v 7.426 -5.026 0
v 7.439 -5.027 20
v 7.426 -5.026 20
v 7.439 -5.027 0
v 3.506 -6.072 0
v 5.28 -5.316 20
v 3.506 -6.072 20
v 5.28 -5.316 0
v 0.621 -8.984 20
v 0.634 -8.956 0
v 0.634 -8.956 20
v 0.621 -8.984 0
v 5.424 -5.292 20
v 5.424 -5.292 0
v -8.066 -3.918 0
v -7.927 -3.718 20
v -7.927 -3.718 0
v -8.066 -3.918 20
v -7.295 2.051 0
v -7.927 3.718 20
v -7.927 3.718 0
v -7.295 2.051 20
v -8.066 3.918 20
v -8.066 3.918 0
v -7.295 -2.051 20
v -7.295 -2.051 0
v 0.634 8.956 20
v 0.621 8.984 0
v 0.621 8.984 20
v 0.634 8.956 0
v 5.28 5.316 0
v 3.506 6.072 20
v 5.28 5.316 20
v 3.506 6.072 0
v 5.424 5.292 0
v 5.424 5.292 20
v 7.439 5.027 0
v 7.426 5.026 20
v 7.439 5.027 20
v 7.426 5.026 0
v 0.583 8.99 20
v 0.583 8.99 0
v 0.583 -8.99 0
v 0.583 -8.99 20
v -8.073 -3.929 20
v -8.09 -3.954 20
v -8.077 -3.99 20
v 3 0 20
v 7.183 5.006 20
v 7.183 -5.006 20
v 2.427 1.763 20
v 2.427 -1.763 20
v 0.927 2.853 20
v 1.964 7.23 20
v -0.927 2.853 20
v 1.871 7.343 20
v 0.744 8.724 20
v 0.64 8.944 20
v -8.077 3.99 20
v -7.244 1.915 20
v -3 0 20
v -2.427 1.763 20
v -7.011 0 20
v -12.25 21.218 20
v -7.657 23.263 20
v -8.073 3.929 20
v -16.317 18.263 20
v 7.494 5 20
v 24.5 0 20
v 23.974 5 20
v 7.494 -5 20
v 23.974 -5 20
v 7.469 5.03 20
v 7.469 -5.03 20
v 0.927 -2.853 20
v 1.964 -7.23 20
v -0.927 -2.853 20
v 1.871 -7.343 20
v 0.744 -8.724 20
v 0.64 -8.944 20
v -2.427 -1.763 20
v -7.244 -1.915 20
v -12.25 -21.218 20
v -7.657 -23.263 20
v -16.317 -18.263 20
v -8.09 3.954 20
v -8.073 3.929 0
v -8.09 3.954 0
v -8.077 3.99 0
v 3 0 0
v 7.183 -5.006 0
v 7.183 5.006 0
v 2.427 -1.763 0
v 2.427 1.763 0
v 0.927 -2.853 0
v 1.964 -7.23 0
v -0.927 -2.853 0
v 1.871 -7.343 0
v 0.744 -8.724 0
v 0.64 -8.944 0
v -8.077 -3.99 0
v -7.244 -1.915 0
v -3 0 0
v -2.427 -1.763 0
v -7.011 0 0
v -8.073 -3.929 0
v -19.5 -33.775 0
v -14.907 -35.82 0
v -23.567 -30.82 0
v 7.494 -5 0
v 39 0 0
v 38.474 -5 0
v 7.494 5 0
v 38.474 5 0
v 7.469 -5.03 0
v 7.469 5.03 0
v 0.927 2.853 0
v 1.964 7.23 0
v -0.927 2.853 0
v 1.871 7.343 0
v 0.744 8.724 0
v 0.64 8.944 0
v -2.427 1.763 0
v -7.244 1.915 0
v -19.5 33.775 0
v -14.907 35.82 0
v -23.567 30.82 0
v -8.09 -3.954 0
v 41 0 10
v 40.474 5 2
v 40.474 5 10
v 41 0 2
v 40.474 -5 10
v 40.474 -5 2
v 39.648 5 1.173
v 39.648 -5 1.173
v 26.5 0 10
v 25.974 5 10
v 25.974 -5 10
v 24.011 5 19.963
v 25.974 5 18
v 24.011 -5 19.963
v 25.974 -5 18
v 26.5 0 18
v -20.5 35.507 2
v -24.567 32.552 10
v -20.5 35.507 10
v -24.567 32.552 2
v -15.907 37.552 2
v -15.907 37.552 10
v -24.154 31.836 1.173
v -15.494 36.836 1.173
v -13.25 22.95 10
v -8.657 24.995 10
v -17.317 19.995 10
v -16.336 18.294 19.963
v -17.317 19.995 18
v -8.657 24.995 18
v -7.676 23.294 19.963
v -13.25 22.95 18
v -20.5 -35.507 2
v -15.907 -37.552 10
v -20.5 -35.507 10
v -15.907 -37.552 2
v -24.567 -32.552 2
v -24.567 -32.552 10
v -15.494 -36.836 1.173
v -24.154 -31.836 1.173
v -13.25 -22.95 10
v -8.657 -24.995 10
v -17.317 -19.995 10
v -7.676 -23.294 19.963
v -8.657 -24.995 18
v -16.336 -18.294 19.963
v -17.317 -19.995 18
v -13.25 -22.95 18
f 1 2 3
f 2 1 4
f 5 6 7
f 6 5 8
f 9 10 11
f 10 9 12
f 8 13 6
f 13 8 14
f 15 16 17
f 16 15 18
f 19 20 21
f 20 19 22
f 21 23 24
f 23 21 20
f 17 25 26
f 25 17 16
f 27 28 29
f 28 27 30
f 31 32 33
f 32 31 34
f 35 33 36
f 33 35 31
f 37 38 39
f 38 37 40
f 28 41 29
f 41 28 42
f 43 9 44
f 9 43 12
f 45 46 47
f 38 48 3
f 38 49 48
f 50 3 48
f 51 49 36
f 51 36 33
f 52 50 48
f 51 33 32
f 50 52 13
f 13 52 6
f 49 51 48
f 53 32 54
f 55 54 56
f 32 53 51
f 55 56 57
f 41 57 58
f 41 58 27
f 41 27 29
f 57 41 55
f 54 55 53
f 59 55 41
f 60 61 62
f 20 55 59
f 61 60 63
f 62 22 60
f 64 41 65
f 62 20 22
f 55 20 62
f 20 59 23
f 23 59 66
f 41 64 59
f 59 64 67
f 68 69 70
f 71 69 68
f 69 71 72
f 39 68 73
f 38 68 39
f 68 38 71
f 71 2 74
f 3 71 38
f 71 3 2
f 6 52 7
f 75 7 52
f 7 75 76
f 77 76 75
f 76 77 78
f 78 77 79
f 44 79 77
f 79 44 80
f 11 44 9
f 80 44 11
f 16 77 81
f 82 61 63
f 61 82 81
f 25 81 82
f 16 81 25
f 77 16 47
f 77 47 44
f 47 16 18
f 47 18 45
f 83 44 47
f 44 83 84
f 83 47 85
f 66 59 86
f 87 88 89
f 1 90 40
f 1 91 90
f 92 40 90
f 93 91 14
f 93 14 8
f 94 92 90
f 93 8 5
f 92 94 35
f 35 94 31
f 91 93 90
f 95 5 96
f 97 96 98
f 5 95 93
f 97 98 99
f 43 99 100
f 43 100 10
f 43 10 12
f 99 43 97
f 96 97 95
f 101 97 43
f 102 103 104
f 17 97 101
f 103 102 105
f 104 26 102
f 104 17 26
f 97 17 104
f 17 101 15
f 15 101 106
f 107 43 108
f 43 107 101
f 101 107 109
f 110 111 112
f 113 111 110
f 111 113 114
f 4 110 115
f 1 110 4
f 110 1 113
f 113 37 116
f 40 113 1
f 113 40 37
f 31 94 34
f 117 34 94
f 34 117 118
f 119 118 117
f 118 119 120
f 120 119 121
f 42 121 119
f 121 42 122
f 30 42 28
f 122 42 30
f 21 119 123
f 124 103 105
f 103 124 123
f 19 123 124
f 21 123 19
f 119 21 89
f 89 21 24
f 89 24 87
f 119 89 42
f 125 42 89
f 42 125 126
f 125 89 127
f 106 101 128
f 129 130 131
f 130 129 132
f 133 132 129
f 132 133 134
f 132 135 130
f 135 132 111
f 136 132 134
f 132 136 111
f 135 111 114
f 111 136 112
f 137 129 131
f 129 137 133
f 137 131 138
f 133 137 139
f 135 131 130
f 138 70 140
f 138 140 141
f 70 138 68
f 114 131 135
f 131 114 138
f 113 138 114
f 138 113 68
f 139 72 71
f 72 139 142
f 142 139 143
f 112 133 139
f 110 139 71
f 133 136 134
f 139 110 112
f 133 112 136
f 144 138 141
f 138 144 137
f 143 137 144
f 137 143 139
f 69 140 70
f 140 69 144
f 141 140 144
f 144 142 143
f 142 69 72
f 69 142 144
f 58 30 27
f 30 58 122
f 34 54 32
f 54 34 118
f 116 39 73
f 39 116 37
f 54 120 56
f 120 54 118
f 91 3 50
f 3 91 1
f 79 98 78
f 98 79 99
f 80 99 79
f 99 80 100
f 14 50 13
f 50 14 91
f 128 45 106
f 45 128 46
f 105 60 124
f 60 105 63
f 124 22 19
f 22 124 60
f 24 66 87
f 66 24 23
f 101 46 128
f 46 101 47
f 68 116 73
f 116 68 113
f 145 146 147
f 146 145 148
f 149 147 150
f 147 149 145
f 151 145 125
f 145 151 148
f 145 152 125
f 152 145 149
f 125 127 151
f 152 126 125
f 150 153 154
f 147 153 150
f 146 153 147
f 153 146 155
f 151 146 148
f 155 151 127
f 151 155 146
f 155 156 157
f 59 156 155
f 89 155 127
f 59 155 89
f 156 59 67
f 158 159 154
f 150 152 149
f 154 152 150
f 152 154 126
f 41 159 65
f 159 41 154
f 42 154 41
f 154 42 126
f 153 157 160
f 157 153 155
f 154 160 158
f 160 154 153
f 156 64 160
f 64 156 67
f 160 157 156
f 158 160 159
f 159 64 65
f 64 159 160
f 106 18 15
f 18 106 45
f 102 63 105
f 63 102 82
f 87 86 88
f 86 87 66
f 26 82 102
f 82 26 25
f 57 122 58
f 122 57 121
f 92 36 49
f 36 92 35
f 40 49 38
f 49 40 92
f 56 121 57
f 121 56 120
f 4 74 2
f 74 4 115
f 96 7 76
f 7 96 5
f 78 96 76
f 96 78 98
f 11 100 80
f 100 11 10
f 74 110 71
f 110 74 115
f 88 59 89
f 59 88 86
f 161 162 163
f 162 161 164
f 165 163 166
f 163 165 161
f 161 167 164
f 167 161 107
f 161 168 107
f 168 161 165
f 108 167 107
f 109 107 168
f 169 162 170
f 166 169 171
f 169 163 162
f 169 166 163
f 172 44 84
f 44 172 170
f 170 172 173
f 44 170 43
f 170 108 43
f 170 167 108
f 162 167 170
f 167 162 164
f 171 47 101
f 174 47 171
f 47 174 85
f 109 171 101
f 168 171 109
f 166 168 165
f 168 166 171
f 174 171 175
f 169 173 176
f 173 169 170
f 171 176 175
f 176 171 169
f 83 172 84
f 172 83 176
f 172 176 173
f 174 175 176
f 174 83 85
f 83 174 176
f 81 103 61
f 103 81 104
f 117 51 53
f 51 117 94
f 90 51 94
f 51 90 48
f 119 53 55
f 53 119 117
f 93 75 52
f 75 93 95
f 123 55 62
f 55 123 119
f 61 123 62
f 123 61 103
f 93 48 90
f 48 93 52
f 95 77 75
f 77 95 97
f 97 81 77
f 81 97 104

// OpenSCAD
/* [Dimensions] */
// Height/depth of large diameter side
large_height=10;
// Height/depth of small diameter side
small_height=10;

// Diameter of spool holes (makerbot spool is 82 and 53)
diameter1=82;
diameter2=53;

strut_width=10;

/* [Options] */
// Lip to hold adapter, use if larger spool hole will be on the bottom
lip=0; // [0:None,2:Small,3:Medium,5:Heavy]
// How far out the lip comes. 0 makes the lip come out as far as it is thick in a bevel (and doesn't need support!)
lip_extent=3; // [0:10]
// Hole in the middle, 0 to disable
hole_diameter=6;
hole=hole_diameter/2;

/* [Tweaks] */
struts=3; // [2:8]
bevel=2;

// Fillet joint between struts (0 to disable)
fillet_radius=8;

/* [Hidden] */

depth=[large_height,small_height];
depth1=large_height;
depth2=small_height;

radii=[max(diameter1,diameter2)/2,min(diameter1,diameter2)/2];

module inner_fillet(r,w,h) {
  angle = 360/(2*struts);
  rh = r/sin(angle);
  wh = w/(2*sin(angle));
  rha = r*sin(angle);
  rhb = rh-rha;
  ro=r*sin(90-angle);
  rl=sqrt(pow(wh+rhb,2)+pow(ro,2));
  difference() {
    cylinder(r=rl,h=h);
    for (i=[180/struts:360/struts:360]) {
      rotate([0,0,-i]) {
        translate([rh+wh,0,-0.1]) {
          cylinder(r=r,h=h+0.2);
        }
      }
    }
  }
}

module chamfer_strut(r,w,h,c) {
  intersection() {
    union() {
      translate([0,0,-min(h,c)]) {
        cylinder(r=r,h=h);
        translate([0,0,h]) {
          cylinder(r1=r,r2=r-c,h=c);
        }
      }
    }
    translate([0,-w/2,0]) {
      cube([r,w,h]);
    }
  }

}

module lip(r,w,t,e) {
  translate([0,0,t]) {
    mirror([0,0,1]) {
      if (e) {
        chamfer_strut(r=r+e,w=w,h=t,c=0);
      } else {
        chamfer_strut(r=r+t,w=w,h=t,c=t);
      }
    }
  }
}

difference() {
  h1=depth1 + lip;
  union() {
    for (i=[0:360/struts:360]) {
      rotate([0,0,i]) {
        if (fillet_radius) {
          inner_fillet(r=fillet_radius,w=strut_width,h=h1+depth[1]);
        }
        translate([0,0,depth[0]]) {
          mirror([0,0,1]) {
            chamfer_strut(r=radii[0],w=strut_width,h=depth[0],c=bevel);
          }
        }
        translate([0,0,h1]) {
          chamfer_strut(r=radii[1],w=strut_width,h=depth[1],c=bevel);
        }
        if (lip) {
          translate([0,0,depth[0]]) {
            lip(r=radii[0],w=strut_width,t=lip,e=lip_extent);
          }
        }
      }
    }
  }
  if (hole) {
    translate([0,0,-0.1]) {
      cylinder(r=hole,h=h1+depth[1]+0.2);
    }
  }
}
